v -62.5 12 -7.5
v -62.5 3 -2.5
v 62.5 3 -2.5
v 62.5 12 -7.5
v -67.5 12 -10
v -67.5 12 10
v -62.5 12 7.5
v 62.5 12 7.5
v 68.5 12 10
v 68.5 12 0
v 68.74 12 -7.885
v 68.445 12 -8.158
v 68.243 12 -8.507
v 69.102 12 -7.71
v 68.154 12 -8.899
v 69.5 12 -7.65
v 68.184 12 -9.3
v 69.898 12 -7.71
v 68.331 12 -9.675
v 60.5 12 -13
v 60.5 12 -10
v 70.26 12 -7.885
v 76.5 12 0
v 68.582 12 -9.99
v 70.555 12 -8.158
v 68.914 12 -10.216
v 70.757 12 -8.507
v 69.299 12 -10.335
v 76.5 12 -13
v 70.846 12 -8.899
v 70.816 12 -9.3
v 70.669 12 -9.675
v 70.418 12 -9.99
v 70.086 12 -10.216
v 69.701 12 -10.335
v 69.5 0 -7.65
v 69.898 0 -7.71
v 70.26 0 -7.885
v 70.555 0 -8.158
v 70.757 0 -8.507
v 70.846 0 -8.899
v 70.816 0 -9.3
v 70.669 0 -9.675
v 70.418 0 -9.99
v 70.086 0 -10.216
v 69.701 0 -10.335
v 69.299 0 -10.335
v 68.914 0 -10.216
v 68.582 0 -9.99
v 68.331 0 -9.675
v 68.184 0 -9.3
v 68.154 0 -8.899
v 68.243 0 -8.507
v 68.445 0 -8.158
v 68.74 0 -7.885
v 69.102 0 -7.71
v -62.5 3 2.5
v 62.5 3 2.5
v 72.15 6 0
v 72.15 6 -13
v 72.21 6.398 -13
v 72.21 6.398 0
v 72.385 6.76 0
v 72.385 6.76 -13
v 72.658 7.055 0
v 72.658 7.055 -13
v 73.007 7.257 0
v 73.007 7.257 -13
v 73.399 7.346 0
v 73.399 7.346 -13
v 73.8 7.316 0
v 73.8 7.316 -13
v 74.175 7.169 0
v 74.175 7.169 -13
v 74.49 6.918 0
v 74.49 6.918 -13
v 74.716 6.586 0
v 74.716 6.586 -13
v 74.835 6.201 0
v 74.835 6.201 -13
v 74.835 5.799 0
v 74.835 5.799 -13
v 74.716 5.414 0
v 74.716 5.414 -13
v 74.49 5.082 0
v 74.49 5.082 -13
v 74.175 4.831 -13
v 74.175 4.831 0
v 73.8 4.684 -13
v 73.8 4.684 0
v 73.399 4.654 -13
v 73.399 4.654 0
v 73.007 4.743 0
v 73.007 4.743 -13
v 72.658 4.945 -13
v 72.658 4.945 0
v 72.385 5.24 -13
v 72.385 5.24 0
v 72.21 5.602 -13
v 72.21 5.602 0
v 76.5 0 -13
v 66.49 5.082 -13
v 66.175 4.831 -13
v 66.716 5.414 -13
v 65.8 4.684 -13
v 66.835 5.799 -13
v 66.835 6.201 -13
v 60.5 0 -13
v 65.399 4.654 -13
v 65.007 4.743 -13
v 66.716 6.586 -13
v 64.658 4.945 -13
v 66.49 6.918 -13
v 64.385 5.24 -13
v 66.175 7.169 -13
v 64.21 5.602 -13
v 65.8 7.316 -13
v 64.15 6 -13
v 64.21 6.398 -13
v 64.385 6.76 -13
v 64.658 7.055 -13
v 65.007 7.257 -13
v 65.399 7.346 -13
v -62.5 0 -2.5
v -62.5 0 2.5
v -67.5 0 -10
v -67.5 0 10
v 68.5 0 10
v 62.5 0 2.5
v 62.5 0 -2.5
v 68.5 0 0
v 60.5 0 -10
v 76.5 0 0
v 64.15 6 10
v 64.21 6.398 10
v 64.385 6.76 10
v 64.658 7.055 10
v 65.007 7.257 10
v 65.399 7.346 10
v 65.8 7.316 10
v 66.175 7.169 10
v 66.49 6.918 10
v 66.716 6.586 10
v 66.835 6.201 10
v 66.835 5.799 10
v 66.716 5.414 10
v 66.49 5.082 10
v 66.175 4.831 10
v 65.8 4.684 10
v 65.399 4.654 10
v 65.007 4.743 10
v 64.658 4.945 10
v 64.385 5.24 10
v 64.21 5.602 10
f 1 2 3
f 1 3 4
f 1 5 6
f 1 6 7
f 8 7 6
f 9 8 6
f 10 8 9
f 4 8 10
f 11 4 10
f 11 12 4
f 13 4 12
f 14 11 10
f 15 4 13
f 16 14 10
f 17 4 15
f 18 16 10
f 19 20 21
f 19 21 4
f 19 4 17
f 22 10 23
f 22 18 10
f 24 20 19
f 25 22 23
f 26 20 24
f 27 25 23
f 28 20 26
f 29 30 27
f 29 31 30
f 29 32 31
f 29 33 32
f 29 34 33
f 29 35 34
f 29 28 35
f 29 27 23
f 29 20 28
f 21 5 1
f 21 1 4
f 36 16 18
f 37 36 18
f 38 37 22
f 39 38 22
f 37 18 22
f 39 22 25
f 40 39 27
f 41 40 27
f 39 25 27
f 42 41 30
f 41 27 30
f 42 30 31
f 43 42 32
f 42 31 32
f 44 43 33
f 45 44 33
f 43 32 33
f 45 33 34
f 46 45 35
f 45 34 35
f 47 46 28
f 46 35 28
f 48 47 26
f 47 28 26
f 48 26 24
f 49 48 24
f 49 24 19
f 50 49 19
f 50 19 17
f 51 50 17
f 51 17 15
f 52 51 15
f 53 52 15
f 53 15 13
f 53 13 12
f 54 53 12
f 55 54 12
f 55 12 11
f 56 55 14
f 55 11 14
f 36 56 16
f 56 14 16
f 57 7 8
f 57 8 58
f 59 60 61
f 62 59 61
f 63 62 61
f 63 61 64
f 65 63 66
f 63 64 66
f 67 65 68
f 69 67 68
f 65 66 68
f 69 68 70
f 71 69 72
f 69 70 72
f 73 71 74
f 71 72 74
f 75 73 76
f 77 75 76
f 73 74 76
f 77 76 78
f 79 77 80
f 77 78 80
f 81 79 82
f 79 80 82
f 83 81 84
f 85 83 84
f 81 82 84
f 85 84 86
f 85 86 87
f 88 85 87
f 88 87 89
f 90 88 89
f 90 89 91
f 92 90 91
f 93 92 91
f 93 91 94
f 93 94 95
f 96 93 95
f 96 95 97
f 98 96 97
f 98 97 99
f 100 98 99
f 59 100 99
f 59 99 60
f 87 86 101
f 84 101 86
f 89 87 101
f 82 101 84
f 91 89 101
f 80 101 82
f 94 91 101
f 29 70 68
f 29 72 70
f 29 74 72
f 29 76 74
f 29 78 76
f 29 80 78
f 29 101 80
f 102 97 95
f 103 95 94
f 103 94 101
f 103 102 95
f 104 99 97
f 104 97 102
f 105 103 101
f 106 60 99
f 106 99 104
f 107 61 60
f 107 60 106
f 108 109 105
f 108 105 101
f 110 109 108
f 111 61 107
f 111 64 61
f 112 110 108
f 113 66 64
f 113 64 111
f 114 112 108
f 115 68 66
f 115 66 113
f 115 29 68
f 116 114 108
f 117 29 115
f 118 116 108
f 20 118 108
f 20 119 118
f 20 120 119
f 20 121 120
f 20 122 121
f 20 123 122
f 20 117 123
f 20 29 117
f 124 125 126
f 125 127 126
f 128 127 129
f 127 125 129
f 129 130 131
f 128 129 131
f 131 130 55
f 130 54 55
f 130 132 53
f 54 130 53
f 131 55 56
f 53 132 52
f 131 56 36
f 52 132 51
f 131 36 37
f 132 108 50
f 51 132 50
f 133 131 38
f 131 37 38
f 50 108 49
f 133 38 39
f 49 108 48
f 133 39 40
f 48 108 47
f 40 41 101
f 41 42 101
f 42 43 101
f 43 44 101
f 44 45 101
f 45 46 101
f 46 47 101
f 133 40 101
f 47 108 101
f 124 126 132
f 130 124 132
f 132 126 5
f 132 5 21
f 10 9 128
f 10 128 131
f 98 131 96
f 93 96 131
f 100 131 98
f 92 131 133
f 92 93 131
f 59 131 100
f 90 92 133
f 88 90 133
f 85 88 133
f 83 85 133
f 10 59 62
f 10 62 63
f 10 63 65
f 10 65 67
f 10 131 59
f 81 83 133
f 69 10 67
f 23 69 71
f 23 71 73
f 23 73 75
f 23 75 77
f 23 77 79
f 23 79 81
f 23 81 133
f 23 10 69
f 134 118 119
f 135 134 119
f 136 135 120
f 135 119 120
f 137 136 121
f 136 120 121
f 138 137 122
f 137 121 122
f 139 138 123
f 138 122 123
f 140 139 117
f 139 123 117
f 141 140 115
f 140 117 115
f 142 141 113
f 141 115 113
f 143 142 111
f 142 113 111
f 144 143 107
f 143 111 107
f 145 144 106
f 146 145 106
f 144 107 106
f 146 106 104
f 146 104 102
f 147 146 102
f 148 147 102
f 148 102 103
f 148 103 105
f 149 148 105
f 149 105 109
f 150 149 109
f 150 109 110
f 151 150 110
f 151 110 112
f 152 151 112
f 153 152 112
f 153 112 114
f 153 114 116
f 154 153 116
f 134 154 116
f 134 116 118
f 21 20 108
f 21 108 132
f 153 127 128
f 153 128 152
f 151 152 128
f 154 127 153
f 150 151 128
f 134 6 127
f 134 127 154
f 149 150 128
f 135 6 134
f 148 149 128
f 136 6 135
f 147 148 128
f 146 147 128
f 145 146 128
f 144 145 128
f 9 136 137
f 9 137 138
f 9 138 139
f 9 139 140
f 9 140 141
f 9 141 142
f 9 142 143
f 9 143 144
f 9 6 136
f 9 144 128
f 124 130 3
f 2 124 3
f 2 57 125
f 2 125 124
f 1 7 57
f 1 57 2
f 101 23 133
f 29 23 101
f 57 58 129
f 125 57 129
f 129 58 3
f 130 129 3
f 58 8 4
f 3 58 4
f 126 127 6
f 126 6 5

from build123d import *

# Parameters (mm, degrees)
SKETCH_1_W           = 135
SKETCH_1_H           = 20
EXTRUDE_3_DEPTH      = 12
CUT_EXTRUDE_1_DEPTH  = 62.5
SKETCH_16_R          = 1.35
EXTRUDE_4_DEPTH      = 12
SKETCH_17_R          = 1.35
CUT_EXTRUDE_12_DEPTH = 81.779019553


with BuildPart() as part:
    # 草图1 → 凸台-拉伸3 (new body)
    with BuildSketch(Plane(origin=(0, 0, 0), x_dir=(1, 0, 0), z_dir=(0, 1, 0))):
        Rectangle(SKETCH_1_W, SKETCH_1_H)
    extrude(amount=EXTRUDE_3_DEPTH)

    # 草图2 → 切除-拉伸1 (cut, symmetric)
    with BuildSketch(Plane(origin=(0, 0, 0), x_dir=(0, 0, -1), z_dir=(1, 0, 0))):
        Polygon((-7.5, 12), (-2.5, 3), (-2.5, 0), (2.5, 0), (2.5, 3), (7.5, 12), align=None)
    extrude(amount=CUT_EXTRUDE_1_DEPTH, both=True, mode=Mode.SUBTRACT)

    # 草图16 → 凸台-拉伸4 (add)
    with BuildSketch(Plane(origin=(0, 12, 0), x_dir=(1, 0, 0), z_dir=(0, 1, 0))):
        Polygon((60.5, 10), (67.5, 10), (67.5, -10), (68.5, -10), (68.5, 0), (76.5, 0), (76.5, 13), (60.5, 13), align=None)
        with Locations(Location((69.5, 9, 0), (0, 0, 270))):
            Circle(SKETCH_16_R, mode=Mode.SUBTRACT)
    extrude(amount=-EXTRUDE_4_DEPTH)

    # 草图17 → 切除-拉伸12 (cut, through all)
    with BuildSketch(Plane(origin=(0, 0, -13), x_dir=(-1, 0, 0), z_dir=(0, 0, -1))):
        with Locations((-65.5, 6)):
            Circle(SKETCH_17_R)
        with Locations((-73.5, 6)):
            Circle(SKETCH_17_R)
    extrude(amount=-CUT_EXTRUDE_12_DEPTH, mode=Mode.SUBTRACT)


solid = part.part
